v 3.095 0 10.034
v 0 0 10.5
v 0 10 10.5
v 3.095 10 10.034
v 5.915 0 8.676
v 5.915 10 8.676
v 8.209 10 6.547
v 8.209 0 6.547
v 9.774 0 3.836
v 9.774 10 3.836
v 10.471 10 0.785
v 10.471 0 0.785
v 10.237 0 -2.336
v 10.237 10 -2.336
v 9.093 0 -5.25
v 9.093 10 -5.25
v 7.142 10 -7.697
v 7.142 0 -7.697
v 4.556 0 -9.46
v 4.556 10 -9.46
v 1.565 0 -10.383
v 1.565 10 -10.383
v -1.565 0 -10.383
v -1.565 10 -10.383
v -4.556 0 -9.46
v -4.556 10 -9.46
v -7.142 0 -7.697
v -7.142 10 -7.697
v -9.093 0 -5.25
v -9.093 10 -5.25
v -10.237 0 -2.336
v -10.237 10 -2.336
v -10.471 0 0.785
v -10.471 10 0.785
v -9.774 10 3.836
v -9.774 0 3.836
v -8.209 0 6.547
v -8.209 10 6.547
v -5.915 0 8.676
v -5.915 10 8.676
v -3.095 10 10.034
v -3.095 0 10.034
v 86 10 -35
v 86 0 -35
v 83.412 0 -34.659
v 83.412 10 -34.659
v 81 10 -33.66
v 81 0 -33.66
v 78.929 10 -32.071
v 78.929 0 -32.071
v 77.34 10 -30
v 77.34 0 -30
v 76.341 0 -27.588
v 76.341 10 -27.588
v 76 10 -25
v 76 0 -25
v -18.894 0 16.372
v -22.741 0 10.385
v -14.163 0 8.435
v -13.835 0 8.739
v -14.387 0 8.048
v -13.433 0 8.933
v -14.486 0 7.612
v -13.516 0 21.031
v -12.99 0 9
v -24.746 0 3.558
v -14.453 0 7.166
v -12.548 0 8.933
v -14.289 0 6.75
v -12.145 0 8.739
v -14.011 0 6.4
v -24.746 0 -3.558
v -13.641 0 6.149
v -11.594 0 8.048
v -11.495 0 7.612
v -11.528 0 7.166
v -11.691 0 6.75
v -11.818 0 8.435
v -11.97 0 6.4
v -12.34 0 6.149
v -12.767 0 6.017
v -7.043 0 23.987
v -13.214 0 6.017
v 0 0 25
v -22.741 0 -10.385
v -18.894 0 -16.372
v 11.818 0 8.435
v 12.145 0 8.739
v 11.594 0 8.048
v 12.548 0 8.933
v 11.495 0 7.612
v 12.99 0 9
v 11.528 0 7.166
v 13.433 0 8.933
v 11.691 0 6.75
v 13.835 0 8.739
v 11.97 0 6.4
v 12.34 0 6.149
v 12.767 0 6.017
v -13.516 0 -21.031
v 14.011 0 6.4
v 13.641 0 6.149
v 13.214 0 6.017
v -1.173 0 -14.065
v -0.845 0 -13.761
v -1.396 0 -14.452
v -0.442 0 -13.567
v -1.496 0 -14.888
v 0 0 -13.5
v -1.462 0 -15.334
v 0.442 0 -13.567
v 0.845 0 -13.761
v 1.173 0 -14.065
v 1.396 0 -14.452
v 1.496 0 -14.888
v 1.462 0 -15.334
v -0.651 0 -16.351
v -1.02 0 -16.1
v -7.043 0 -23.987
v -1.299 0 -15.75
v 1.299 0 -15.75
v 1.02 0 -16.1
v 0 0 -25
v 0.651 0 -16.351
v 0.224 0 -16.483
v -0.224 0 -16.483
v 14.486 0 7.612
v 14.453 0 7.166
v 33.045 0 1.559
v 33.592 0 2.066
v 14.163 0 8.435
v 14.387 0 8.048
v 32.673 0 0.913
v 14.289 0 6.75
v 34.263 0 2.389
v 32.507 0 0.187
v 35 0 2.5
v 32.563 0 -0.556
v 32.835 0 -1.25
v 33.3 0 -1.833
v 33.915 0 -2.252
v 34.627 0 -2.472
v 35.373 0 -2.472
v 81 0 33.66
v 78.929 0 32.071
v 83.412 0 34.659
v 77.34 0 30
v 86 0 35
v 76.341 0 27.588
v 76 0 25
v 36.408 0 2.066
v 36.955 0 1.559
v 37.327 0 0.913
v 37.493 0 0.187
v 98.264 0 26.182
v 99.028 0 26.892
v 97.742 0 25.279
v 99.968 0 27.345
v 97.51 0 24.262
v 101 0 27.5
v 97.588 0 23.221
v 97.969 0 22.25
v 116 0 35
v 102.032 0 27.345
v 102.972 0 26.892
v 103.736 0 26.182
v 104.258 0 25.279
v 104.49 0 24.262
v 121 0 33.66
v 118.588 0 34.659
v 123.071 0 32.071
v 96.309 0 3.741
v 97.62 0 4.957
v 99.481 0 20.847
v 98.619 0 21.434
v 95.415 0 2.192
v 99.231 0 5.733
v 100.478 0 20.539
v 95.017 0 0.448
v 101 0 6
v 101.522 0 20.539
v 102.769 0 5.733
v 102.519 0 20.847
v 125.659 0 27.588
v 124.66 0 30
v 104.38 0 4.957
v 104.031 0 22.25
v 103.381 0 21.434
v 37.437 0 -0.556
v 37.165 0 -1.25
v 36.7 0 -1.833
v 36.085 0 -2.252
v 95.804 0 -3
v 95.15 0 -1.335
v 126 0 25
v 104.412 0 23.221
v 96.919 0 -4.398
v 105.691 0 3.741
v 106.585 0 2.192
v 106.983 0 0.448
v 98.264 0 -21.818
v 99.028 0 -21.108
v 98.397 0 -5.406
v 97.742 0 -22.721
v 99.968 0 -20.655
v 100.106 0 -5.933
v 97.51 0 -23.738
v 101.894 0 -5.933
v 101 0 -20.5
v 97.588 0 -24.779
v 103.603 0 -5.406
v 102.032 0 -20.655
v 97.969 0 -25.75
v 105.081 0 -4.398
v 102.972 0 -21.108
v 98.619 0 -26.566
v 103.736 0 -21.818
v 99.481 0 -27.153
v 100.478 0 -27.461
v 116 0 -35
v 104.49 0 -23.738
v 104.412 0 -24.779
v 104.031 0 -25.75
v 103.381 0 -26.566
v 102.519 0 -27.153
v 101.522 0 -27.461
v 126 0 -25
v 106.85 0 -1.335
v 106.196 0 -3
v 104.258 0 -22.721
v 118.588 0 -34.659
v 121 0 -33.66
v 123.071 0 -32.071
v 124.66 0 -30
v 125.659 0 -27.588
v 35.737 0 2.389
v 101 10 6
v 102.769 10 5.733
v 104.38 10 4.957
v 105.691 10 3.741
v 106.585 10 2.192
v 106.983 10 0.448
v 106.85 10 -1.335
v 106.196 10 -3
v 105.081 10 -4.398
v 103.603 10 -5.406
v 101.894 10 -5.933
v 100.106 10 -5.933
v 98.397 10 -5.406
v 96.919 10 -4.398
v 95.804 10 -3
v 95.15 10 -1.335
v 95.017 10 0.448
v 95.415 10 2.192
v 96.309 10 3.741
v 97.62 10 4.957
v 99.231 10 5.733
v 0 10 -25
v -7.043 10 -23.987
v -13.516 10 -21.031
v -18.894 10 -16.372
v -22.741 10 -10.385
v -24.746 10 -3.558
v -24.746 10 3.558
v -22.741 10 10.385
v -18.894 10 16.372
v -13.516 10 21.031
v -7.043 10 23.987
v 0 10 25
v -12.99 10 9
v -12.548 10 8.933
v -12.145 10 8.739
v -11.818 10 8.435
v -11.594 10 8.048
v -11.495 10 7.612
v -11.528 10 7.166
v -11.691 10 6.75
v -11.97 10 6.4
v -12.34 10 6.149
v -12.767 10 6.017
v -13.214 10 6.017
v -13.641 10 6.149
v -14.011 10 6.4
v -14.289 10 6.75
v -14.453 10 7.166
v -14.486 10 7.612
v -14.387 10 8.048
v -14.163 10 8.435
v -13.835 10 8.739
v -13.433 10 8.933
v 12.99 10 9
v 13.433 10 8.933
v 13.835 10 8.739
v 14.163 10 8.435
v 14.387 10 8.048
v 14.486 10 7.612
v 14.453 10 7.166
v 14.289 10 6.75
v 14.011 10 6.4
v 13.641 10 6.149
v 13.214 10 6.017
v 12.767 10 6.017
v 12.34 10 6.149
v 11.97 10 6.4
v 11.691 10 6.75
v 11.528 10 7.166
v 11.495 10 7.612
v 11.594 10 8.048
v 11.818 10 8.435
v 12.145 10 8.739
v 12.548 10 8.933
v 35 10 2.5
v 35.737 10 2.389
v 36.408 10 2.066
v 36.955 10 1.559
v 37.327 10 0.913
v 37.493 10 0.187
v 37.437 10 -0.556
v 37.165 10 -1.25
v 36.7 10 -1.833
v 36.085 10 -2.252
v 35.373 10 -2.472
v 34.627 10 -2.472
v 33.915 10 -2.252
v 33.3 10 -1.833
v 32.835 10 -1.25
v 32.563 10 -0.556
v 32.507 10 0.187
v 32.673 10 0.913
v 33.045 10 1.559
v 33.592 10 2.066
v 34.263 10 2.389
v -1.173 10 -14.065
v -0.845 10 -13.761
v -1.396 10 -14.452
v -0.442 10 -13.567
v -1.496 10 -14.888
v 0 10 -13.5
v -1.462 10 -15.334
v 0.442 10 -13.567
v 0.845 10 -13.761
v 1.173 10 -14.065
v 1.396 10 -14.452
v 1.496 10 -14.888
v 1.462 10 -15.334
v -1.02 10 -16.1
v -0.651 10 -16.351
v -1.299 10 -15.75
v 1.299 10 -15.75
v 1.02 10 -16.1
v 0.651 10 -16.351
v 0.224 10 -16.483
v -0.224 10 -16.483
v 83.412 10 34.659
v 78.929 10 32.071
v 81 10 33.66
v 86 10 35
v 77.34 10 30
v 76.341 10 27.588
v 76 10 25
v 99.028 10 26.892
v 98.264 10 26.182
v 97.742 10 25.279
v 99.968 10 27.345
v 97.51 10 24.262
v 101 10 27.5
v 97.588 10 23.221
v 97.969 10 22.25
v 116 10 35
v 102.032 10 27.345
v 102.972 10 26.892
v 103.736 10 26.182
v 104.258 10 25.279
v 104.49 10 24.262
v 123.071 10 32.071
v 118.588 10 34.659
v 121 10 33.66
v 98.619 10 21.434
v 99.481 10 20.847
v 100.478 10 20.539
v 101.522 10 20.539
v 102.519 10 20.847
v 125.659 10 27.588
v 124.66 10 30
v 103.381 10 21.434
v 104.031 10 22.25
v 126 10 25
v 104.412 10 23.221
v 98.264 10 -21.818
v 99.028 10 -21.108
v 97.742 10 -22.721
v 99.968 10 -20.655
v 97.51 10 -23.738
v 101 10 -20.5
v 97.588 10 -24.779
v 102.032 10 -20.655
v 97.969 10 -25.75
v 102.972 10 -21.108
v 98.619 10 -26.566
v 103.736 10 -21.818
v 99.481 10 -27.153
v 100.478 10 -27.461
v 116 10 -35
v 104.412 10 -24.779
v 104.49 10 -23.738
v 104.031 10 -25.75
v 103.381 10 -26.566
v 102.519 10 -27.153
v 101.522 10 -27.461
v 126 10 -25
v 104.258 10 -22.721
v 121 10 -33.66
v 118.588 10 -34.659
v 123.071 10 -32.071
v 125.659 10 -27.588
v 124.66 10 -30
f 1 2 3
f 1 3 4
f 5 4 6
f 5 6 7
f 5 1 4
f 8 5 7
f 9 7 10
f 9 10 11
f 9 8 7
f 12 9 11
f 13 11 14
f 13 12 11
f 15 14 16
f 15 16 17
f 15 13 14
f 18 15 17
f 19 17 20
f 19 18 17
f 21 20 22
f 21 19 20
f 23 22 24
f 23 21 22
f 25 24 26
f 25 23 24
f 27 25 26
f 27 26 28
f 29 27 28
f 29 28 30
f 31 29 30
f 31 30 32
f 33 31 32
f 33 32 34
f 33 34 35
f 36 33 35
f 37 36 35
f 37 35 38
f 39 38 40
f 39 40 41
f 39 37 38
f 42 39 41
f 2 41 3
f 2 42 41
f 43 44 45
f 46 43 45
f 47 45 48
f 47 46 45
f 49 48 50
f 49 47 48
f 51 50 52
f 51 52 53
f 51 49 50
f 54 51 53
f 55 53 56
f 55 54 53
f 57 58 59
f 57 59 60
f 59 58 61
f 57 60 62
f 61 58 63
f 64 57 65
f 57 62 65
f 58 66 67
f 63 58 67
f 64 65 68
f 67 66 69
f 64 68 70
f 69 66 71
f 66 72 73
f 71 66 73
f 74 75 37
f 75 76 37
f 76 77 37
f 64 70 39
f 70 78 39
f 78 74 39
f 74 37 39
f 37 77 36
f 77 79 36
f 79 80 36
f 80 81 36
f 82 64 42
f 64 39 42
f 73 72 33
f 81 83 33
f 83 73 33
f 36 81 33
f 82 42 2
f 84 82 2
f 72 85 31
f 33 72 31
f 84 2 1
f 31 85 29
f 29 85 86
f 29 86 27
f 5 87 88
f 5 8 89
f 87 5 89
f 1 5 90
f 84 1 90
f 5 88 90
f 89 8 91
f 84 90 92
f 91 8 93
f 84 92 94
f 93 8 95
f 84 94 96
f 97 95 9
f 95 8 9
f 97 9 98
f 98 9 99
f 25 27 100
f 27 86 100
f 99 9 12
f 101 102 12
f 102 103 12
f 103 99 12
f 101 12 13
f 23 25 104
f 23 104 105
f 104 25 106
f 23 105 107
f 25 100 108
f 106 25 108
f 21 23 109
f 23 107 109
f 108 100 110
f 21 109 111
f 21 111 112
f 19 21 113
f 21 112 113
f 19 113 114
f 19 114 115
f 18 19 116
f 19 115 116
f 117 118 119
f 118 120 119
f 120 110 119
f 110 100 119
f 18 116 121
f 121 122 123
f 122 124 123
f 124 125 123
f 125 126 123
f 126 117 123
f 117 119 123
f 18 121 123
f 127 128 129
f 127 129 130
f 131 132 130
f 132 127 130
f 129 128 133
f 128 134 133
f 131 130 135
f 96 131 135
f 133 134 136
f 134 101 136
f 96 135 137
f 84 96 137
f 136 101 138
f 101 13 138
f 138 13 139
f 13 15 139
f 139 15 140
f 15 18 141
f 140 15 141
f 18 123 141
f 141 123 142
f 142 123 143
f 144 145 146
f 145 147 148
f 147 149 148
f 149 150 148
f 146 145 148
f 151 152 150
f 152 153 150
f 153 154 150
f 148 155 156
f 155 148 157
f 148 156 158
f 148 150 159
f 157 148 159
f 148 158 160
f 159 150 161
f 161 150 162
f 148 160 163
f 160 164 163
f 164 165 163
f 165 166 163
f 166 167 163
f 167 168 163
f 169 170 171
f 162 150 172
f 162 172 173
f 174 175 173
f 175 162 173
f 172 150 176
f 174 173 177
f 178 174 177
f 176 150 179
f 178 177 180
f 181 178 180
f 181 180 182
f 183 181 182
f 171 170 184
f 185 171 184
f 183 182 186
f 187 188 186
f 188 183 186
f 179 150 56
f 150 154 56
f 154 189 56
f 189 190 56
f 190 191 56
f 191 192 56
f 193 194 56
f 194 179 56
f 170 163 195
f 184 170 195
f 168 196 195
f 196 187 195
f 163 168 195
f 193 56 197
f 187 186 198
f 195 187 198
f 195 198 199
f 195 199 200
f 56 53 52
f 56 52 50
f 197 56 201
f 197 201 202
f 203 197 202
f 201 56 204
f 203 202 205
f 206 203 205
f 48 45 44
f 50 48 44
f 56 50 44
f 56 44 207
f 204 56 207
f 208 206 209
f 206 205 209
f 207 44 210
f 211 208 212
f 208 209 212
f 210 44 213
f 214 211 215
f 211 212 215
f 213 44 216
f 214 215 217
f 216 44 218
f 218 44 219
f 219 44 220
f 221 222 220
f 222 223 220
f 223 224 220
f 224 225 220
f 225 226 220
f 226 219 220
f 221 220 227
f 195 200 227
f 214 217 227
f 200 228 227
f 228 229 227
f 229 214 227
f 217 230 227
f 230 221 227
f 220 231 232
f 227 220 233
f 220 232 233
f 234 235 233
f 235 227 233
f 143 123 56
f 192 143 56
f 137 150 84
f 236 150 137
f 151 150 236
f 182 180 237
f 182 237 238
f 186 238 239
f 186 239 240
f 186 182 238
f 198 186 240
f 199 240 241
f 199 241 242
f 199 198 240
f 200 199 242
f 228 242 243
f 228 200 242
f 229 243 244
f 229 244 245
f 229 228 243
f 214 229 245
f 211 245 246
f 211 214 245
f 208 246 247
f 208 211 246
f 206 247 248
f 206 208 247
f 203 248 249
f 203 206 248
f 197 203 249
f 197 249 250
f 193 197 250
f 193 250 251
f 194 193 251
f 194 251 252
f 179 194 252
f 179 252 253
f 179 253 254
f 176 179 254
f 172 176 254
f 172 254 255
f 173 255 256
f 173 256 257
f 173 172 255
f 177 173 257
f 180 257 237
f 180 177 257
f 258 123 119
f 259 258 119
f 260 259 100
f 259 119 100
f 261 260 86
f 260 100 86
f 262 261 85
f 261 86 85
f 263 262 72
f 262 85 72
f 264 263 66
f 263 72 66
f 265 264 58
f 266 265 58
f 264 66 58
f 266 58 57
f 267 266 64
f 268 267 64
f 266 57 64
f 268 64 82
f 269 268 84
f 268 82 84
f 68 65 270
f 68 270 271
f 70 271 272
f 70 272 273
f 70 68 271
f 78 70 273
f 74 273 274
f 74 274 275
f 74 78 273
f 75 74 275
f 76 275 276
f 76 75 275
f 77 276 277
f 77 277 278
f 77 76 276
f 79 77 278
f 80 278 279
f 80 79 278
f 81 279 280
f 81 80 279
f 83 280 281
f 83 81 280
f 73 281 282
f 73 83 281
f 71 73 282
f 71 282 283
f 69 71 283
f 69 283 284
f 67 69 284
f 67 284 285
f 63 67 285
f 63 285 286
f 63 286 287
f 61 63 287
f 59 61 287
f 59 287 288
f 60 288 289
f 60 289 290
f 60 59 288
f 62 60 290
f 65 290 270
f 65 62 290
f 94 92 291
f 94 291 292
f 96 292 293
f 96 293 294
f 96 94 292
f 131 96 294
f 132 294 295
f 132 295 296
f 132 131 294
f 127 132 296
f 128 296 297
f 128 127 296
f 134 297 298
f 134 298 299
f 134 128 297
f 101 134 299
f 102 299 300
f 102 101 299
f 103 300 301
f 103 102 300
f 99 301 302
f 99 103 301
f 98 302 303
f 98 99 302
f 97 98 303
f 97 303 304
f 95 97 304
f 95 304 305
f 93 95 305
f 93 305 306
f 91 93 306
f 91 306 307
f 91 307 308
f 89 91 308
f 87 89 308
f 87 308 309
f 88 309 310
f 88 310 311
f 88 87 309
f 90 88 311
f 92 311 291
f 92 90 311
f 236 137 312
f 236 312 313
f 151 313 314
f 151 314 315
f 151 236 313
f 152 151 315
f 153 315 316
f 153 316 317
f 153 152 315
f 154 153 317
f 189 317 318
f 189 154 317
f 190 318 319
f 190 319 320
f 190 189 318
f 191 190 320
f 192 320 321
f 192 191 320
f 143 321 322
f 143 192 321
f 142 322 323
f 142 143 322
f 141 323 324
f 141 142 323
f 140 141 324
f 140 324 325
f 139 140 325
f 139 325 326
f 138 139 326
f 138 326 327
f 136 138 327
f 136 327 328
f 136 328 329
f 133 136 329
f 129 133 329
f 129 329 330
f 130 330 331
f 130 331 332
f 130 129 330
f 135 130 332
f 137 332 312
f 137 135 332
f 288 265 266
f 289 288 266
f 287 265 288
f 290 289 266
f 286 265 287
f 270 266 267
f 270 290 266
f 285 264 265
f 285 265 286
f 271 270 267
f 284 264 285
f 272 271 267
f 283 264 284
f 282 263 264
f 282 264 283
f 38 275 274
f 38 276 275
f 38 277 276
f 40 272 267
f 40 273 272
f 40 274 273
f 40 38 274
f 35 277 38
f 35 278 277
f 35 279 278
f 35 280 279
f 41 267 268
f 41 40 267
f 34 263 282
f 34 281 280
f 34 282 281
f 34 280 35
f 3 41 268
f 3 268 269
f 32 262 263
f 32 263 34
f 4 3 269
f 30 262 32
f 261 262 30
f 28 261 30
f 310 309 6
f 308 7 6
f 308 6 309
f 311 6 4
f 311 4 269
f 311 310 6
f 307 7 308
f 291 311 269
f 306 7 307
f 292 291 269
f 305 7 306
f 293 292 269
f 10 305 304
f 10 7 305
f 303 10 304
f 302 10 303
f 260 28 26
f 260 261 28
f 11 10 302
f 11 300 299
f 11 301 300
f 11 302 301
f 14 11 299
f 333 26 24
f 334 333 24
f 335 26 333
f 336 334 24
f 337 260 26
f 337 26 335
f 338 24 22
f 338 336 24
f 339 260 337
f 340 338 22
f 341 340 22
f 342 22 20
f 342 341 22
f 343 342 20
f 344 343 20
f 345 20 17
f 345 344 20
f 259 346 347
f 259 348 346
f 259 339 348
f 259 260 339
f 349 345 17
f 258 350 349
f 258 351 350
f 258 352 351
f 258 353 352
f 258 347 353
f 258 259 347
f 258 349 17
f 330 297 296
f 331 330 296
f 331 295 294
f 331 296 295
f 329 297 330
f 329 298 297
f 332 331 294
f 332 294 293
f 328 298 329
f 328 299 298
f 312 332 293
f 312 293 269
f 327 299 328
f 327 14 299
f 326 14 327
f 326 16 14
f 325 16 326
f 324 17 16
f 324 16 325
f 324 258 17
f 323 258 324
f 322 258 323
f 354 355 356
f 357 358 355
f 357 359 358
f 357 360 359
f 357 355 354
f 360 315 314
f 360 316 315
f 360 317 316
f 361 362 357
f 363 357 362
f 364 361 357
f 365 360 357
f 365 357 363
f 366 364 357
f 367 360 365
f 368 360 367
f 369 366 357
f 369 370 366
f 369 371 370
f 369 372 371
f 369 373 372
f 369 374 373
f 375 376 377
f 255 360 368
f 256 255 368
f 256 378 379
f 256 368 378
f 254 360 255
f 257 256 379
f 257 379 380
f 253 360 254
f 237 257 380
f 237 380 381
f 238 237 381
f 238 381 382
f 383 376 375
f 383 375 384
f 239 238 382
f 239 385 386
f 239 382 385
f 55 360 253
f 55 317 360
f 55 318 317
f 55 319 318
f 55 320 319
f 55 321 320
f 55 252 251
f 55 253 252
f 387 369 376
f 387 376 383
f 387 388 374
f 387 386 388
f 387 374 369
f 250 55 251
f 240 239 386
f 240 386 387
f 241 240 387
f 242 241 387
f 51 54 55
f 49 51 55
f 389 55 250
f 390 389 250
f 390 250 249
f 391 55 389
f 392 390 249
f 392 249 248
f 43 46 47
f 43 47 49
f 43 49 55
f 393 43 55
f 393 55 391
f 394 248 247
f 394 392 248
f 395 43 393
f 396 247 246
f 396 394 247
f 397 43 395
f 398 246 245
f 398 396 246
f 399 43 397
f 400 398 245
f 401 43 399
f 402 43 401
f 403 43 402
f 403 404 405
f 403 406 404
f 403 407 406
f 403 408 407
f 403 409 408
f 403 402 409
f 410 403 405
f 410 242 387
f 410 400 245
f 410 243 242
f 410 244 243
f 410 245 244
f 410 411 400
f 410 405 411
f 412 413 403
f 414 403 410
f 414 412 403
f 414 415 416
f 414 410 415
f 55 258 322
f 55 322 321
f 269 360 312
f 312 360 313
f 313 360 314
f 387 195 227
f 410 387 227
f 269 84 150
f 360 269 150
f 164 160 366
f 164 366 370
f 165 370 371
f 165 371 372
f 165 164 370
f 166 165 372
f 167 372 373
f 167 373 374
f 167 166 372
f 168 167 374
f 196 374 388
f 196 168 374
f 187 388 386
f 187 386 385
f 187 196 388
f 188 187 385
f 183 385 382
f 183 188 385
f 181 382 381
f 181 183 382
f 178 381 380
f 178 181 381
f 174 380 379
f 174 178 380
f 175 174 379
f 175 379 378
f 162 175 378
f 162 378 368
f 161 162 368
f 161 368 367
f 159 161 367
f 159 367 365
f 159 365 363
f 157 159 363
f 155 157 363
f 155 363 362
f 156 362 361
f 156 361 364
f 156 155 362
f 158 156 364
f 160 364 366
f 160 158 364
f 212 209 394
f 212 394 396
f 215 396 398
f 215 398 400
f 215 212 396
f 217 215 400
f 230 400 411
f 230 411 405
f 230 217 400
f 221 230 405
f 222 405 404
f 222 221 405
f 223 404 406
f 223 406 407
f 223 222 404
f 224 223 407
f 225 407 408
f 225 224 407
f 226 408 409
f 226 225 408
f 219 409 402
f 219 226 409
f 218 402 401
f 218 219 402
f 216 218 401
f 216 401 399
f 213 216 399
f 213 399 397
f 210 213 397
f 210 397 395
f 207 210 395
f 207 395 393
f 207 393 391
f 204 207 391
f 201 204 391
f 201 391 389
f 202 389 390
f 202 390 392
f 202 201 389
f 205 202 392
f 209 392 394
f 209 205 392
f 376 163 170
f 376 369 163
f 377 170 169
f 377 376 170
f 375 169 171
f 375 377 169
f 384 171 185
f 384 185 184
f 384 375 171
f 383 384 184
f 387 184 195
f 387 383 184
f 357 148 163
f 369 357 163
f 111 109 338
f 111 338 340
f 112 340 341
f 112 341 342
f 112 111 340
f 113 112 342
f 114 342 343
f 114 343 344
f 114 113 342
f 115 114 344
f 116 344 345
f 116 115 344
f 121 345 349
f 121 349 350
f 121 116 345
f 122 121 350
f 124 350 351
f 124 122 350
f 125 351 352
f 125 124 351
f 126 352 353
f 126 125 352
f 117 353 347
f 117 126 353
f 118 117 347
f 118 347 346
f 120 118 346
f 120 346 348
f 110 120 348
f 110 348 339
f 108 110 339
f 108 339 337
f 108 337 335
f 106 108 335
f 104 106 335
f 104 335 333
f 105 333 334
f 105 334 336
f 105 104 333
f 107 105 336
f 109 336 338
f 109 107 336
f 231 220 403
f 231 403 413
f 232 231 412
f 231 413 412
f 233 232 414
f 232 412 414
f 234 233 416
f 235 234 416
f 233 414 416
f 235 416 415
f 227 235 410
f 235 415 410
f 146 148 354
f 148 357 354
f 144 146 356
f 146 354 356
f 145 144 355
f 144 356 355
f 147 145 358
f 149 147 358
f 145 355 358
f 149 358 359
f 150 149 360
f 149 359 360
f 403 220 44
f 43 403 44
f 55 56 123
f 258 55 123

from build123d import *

# Parameters (mm, degrees)
SKETCH1_R           = 3.5
SKETCH1_R_2         = 6
SKETCH1_R_3         = 2.5
SKETCH1_R_4         = 1.5
SKETCH1_R_5         = 10.5
BOSS_EXTRUDE1_DEPTH = 10
FILLET1_R           = 10
FILLET2_R           = 10
FILLET3_R           = 10
FILLET4_R           = 10


with BuildPart() as part:
    # Sketch1 → Boss-Extrude1 (new body)
    with BuildSketch(Plane(origin=(0, 0, 0), x_dir=(1, 0, 0), z_dir=(0, 1, 0))):
        with BuildLine():
            Line((76.000002703, -25), (76.000002703, -35))
            Line((76.000002703, -35), (126.000002703, -35))
            Line((126.000002703, -35), (126.000002703, 35))
            Line((126.000002703, 35), (76.000002703, 35))
            Line((76.000002703, 35), (76.000002703, 25))
            Line((76.000002703, 25), (0, 25))
            ThreePointArc((0, 25), (-25, 0), (0, -25))
            Line((0, -25), (76.000002703, -25))
        make_face()
        with Locations(Location((101.000002703, 24, 0), (0, 0, 270))):
            Circle(SKETCH1_R, mode=Mode.SUBTRACT)
        with Locations(Location((101.000002703, -24, 0), (0, 0, 270))):
            Circle(SKETCH1_R, mode=Mode.SUBTRACT)
        with Locations(Location((101.000002703, 0, 0), (0, 0, 270))):
            Circle(SKETCH1_R_2, mode=Mode.SUBTRACT)
        with Locations(Location((35, 0, 0), (0, 0, 270))):
            Circle(SKETCH1_R_3, mode=Mode.SUBTRACT)
        with Locations(Location((0, 15, 0), (0, 0, 270))):
            Circle(SKETCH1_R_4, mode=Mode.SUBTRACT)
        with Locations(Location((12.990377534, -7.499997966, 0), (0, 0, 270))):
            Circle(SKETCH1_R_4, mode=Mode.SUBTRACT)
        with Locations(Location((-12.990376356, -7.500008143, 0), (0, 0, 270))):
            Circle(SKETCH1_R_4, mode=Mode.SUBTRACT)
        with Locations(Location((0, 0, 0), (0, 0, 270))):
            Circle(SKETCH1_R_5, mode=Mode.SUBTRACT)
    extrude(amount=BOSS_EXTRUDE1_DEPTH)

    # Fillet1
    fillet1_edges = [part.edges().sort_by_distance(p)[0] for p in [
        (126.000002703, 5, 35),
    ]]
    fillet(fillet1_edges, radius=FILLET1_R)

    # Fillet2
    fillet2_edges = [part.edges().sort_by_distance(p)[0] for p in [
        (76.000002703, 5, 35),
    ]]
    fillet(fillet2_edges, radius=FILLET2_R - 0.0001)  # a hair under: the kernel refuses the full size

    # Fillet3
    fillet3_edges = [part.edges().sort_by_distance(p)[0] for p in [
        (76.000002703, 5, -35),
    ]]
    fillet(fillet3_edges, radius=FILLET3_R - 0.0001)  # a hair under: the kernel refuses the full size

    # Fillet4
    fillet4_edges = [part.edges().sort_by_distance(p)[0] for p in [
        (126.000002703, 5, -35),
    ]]
    fillet(fillet4_edges, radius=FILLET4_R)


solid = part.part
